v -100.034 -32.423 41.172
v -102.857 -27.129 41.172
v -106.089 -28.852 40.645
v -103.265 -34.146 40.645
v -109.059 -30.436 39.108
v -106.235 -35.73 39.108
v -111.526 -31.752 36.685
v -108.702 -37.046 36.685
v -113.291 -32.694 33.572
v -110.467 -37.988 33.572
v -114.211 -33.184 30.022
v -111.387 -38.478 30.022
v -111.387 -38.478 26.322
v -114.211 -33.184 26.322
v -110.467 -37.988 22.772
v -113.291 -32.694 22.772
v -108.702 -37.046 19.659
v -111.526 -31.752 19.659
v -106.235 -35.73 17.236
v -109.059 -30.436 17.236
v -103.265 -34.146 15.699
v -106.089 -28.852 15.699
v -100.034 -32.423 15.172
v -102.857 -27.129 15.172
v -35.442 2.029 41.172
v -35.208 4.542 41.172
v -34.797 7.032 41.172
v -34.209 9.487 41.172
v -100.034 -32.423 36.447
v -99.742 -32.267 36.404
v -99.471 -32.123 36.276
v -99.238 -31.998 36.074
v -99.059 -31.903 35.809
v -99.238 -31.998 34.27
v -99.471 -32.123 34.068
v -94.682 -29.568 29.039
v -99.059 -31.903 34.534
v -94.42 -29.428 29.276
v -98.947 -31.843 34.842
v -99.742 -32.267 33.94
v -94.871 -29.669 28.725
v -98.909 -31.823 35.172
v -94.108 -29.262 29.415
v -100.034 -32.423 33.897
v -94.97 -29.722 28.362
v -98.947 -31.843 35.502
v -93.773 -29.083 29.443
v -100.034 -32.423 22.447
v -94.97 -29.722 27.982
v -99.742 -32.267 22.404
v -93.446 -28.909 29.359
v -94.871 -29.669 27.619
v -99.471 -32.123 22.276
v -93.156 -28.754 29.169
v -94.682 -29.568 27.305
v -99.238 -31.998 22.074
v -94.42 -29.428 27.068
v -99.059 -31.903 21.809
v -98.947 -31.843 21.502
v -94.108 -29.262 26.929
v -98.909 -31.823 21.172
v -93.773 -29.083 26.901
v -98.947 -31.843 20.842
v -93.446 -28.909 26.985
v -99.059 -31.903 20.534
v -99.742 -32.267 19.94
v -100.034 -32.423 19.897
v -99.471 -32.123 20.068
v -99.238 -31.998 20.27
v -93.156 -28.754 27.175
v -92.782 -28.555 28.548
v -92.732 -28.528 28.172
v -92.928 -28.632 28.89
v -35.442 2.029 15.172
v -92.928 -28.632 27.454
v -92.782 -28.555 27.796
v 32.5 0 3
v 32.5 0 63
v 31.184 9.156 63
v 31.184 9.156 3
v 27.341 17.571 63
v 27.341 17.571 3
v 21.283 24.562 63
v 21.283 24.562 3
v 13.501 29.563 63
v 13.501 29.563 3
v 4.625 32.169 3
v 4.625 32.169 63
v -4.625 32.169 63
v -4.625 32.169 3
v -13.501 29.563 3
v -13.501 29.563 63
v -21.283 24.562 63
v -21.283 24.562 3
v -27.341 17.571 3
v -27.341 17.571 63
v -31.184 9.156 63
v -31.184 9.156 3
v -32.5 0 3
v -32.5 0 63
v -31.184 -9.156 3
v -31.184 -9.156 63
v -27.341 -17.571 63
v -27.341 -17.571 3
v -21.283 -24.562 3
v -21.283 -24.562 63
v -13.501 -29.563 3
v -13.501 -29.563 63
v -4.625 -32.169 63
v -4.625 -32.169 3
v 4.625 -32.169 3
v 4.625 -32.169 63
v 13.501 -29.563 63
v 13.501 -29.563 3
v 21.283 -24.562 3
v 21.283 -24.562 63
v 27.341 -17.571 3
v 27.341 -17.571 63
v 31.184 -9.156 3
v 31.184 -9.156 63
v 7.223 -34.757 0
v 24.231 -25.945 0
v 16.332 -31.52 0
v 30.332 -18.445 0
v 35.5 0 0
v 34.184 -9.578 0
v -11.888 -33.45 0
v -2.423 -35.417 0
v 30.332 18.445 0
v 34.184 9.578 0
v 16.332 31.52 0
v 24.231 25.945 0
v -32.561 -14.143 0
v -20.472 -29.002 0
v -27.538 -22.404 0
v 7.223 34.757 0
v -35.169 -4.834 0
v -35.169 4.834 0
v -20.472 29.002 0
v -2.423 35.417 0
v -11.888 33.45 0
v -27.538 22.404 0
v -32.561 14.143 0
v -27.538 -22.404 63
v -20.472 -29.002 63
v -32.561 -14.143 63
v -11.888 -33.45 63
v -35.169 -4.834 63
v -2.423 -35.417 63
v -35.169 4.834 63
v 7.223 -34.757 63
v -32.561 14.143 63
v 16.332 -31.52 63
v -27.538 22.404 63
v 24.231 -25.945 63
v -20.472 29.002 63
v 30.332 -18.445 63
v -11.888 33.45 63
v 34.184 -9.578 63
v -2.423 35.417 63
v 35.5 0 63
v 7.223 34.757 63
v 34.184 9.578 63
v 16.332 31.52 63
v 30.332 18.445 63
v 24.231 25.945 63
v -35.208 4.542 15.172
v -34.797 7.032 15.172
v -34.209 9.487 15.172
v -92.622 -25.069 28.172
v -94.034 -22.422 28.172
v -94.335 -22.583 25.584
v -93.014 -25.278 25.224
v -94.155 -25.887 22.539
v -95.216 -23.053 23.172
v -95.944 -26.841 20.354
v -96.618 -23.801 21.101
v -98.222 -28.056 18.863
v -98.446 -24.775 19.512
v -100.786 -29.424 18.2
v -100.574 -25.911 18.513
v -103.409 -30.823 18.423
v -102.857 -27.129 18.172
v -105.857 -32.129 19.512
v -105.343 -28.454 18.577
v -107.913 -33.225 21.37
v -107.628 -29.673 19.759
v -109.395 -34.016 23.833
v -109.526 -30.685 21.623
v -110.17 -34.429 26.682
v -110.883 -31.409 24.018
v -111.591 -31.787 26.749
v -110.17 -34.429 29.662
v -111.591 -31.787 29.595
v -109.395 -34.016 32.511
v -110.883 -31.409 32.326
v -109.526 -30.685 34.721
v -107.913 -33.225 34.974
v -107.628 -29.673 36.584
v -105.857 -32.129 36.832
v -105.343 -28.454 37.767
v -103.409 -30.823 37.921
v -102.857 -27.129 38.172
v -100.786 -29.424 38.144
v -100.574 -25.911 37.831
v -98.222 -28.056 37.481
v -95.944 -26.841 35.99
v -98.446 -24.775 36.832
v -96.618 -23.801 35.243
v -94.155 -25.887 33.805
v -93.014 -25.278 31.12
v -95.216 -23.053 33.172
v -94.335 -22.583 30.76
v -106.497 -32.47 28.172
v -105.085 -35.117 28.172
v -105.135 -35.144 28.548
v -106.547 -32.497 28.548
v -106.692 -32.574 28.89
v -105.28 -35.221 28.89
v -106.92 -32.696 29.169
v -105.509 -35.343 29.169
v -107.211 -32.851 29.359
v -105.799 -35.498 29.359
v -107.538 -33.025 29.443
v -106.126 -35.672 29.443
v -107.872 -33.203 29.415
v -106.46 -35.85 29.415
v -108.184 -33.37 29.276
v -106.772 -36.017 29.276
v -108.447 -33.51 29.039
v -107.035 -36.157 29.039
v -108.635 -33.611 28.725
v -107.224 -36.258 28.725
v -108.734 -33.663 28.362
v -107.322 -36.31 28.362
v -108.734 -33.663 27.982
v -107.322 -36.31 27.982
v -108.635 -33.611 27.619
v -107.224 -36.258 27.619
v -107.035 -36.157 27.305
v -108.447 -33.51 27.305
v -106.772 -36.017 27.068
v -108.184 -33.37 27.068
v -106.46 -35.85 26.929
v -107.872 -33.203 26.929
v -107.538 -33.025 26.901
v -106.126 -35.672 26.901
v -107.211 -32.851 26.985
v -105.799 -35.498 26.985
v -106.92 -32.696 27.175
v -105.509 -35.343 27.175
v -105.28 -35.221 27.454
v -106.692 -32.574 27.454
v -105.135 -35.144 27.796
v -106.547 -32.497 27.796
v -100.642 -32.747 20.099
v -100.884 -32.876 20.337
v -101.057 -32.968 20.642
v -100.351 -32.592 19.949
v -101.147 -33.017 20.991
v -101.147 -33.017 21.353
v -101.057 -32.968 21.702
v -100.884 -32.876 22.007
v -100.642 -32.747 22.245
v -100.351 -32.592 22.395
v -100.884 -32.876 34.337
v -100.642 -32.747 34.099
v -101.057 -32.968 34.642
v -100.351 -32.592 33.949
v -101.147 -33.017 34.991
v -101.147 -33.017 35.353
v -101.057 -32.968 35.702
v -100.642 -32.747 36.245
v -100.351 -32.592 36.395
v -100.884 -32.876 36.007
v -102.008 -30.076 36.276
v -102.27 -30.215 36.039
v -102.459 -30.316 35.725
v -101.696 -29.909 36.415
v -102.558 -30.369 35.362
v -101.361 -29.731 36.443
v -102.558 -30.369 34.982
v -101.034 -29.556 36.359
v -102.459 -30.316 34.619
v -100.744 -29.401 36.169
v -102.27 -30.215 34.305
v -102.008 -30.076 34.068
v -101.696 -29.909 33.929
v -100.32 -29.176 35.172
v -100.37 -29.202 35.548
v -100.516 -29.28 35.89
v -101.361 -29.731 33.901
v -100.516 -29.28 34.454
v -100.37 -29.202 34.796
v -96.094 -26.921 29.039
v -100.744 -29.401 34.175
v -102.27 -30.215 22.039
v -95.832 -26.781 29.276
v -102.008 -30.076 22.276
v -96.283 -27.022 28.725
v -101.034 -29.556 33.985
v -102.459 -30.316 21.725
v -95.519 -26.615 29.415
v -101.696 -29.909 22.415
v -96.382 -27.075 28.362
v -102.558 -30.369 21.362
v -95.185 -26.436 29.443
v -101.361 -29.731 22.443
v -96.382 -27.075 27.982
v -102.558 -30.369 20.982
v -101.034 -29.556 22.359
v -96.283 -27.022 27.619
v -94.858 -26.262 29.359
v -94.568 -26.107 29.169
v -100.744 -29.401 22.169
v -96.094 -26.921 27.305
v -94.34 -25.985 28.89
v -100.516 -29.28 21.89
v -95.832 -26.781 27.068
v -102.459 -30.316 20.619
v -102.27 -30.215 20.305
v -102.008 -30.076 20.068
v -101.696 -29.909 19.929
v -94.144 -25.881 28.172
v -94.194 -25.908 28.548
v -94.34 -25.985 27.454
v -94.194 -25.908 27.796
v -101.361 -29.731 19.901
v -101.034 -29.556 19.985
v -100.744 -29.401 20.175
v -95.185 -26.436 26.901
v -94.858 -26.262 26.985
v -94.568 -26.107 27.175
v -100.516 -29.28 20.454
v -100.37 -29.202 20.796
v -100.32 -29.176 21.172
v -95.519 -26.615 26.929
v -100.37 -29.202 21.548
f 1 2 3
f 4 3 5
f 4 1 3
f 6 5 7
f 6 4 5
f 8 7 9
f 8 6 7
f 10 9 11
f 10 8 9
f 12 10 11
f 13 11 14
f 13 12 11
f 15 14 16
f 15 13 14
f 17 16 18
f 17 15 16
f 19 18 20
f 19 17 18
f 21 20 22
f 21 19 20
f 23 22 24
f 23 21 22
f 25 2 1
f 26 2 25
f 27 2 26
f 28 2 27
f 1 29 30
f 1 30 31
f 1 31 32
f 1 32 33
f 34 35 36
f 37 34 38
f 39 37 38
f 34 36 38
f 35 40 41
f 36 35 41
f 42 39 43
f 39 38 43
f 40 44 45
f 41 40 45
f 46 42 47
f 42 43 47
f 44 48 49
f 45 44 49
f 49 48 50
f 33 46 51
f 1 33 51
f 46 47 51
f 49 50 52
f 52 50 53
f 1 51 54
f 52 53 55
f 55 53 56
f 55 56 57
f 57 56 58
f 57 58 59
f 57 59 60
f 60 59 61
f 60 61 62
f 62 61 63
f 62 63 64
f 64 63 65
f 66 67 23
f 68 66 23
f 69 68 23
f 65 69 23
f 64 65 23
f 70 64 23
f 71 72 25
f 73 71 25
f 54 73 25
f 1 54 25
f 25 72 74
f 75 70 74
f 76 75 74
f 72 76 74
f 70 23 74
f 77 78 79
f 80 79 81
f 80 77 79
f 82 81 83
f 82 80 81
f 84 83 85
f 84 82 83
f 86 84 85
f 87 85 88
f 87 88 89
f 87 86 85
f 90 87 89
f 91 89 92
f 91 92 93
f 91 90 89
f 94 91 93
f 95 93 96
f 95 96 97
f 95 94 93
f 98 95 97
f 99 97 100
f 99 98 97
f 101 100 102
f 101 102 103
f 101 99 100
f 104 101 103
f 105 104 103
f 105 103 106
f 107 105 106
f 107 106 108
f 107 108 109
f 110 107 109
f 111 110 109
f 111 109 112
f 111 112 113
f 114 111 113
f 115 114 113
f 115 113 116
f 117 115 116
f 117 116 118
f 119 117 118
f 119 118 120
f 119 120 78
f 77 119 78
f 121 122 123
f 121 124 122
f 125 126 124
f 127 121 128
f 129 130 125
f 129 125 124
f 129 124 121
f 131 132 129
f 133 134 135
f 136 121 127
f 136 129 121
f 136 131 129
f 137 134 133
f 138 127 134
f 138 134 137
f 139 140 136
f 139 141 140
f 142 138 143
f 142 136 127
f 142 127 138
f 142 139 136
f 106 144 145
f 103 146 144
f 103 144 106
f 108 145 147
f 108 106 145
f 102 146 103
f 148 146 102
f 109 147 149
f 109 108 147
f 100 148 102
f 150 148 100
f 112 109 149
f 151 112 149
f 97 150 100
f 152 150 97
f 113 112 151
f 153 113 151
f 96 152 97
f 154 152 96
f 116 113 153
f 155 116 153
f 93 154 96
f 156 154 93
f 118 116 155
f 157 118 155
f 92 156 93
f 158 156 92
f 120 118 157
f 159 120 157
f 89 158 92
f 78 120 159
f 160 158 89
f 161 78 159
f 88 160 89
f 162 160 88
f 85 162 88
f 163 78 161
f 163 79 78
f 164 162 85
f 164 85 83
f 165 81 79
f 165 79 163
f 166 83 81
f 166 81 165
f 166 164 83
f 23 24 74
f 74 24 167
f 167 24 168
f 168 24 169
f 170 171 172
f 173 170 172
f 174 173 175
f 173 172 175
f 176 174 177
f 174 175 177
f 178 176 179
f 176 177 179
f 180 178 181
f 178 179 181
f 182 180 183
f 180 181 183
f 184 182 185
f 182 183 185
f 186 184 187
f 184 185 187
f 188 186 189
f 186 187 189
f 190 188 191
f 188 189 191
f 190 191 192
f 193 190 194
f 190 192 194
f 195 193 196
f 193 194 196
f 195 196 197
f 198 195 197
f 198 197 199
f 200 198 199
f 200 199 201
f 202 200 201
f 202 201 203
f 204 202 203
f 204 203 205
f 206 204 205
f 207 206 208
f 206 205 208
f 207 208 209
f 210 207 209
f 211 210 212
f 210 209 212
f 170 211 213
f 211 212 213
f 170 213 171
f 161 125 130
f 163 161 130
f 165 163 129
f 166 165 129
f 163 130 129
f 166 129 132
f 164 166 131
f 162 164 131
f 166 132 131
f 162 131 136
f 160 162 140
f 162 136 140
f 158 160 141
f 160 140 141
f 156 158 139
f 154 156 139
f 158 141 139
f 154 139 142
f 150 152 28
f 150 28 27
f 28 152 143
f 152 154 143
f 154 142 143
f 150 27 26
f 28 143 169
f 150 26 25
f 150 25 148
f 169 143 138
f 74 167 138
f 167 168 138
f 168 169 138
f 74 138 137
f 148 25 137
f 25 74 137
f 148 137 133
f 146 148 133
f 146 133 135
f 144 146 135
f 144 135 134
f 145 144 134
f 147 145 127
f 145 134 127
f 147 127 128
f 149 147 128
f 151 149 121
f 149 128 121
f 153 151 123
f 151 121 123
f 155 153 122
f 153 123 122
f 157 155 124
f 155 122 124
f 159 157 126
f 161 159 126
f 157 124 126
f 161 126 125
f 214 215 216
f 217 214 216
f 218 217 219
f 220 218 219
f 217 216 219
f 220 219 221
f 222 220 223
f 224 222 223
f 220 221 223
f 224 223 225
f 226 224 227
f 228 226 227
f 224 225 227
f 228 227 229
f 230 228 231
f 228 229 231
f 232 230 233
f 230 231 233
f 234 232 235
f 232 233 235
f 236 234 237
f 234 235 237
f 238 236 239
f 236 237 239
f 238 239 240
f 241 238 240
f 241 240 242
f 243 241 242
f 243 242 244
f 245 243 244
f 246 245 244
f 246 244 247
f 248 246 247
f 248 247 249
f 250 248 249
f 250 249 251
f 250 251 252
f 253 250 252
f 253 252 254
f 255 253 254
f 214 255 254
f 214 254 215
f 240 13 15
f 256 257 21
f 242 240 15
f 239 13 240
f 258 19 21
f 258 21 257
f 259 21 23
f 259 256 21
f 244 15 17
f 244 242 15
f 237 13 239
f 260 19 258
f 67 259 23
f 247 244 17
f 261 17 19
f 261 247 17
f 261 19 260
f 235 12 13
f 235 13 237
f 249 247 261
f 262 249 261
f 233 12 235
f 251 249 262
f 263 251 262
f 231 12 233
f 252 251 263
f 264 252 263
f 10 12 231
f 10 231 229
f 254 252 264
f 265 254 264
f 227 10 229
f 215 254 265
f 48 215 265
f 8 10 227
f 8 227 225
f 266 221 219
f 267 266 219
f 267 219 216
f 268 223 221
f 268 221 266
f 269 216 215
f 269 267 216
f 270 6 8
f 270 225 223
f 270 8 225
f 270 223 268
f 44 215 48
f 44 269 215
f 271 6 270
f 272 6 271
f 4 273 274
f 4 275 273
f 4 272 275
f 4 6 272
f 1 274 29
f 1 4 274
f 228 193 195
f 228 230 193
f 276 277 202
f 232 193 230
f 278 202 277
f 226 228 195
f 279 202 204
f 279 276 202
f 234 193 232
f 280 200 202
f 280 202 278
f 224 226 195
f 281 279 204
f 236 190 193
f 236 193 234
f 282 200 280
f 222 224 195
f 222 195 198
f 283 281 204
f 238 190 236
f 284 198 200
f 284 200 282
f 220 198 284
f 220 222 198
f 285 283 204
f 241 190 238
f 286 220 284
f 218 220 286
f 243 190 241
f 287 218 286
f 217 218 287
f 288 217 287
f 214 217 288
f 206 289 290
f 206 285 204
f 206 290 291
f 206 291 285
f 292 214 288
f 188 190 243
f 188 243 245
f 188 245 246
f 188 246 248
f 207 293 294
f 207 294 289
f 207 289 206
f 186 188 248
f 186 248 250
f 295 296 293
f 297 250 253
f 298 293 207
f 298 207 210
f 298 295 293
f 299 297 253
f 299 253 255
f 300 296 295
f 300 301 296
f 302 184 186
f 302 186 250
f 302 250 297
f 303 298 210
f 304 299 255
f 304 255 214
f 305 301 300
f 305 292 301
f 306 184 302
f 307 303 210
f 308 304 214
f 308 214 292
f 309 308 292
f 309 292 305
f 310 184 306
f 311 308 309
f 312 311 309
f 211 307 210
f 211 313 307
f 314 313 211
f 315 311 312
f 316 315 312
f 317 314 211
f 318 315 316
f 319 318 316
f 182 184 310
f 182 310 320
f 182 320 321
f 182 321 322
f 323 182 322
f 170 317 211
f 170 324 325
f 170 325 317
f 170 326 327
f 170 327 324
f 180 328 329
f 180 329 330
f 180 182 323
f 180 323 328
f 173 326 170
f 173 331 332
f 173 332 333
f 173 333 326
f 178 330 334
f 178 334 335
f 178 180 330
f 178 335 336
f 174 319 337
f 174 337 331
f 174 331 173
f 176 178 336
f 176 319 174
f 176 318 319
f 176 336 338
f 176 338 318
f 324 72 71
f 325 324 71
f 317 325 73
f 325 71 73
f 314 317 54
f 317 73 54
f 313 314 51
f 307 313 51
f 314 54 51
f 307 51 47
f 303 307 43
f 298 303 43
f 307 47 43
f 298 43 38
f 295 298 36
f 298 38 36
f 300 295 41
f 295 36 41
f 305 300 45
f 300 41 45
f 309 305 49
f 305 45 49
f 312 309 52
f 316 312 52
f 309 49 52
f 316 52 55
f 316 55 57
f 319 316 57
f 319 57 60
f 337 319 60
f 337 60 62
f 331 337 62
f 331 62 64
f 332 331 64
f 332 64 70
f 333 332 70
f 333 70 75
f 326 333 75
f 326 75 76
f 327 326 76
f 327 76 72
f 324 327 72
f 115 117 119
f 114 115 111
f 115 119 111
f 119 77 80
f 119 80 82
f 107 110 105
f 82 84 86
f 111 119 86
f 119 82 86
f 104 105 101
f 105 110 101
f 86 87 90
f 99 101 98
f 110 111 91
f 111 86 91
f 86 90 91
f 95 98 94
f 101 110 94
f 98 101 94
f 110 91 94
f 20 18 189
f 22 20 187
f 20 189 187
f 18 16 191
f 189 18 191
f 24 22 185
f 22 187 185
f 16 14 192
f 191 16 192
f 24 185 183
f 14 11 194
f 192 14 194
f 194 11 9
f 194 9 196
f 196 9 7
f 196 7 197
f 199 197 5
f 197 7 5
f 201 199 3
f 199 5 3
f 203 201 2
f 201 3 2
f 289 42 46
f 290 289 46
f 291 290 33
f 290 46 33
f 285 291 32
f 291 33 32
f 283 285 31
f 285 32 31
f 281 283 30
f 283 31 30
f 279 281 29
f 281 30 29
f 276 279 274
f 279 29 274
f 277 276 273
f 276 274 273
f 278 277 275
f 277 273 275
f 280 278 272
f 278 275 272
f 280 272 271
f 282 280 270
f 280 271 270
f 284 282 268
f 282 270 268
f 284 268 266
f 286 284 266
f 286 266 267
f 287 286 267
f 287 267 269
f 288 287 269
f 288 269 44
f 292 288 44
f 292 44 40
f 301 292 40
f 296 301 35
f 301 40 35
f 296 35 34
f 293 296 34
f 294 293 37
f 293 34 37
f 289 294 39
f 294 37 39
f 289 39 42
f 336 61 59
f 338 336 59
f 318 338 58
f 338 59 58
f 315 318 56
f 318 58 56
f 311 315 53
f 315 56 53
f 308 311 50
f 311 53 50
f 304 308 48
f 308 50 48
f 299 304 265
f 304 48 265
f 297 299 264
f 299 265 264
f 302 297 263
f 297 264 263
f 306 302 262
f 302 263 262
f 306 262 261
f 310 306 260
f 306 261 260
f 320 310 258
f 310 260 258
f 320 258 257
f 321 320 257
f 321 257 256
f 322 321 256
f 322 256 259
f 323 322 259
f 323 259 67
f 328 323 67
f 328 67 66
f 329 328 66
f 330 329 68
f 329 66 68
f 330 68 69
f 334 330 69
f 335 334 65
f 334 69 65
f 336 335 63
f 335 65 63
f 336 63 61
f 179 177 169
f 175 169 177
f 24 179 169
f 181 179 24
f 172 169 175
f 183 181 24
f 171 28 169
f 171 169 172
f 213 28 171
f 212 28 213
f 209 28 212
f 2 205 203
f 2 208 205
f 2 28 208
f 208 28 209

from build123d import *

# Parameters (mm, degrees)
SKETCH1_R                = 35.5
SKETCH1_R_2              = 32.5
BOSS_EXTRUDE1_DEPTH      = 63
SKETCH2_R                = 32.5
BOSS_EXTRUDE2_DEPTH      = 3
BOSS_EXTRUDE6_DEPTH      = 14.275
BOSS_EXTRUDE6_DEPTH_BACK = 11.725
SKETCH7_R                = 13
BOSS_EXTRUDE7_DEPTH      = 6
SKETCH8_R                = 10
CUT_EXTRUDE1_DEPTH       = 3
SKETCH9_R                = 1.275
CUT_EXTRUDE2_DEPTH       = 67.65770114


with BuildPart() as part:
    # Sketch1 → Boss-Extrude1 (new body)
    with BuildSketch(Plane.XY):
        Circle(SKETCH1_R)
        Circle(SKETCH1_R_2, mode=Mode.SUBTRACT)
    extrude(amount=BOSS_EXTRUDE1_DEPTH)

    # Sketch2 → Boss-Extrude2 (add)
    with BuildSketch(Plane(origin=(0, 0, 0), x_dir=(-1, 0, 0), z_dir=(0, 0, -1))):
        Circle(SKETCH2_R)
    extrude(amount=-BOSS_EXTRUDE2_DEPTH)

    # Sketch6 → Boss-Extrude6 (add, two sides)
    with BuildSketch(Plane.XY.offset(26.896958138)) as boss_extrude6_sk:
        with BuildLine():
            Line((-34.208935101, 9.486767586), (-102.85732032, -27.128564879))
            Line((-102.85732032, -27.128564879), (-100.033619175, -32.422590931))
            Line((-100.033619175, -32.422590931), (-35.441970042, 2.028979924))
            ThreePointArc((-35.441970042, 2.028979924), (-35.024517071, 5.790786127), (-34.208935101, 9.486767586))
        make_face()
    extrude(amount=BOSS_EXTRUDE6_DEPTH)
    extrude(boss_extrude6_sk.sketch, amount=-BOSS_EXTRUDE6_DEPTH_BACK)

    # Sketch7 → Boss-Extrude7 (add)
    with BuildSketch(Plane(origin=(-8.692215236, 16.296630393, 0), x_dir=(0.882337675, 0.470616858, 0), z_dir=(0.470616858, -0.882337675, 0))):
        with Locations((-103.522048859, 28.171958138)):
            Circle(SKETCH7_R)
    extrude(amount=-BOSS_EXTRUDE7_DEPTH)

    # Sketch8 → Cut-Extrude1 (cut)
    with BuildSketch(Plane(origin=(-11.515916381, 21.590656445, 0), x_dir=(0.882337675, 0.470616858, 0), z_dir=(-0.470616858, 0.882337675, 0))):
        with Locations((-103.522048859, -28.171958138)):
            Circle(SKETCH8_R)
    extrude(amount=-CUT_EXTRUDE1_DEPTH, mode=Mode.SUBTRACT)

    # Sketch9 → Cut-Extrude2 (cut, through all)
    with BuildSketch(Plane(origin=(-8.692215236, 16.296630393, 0), x_dir=(0.882337675, 0.470616858, 0), z_dir=(0.470616858, -0.882337675, 0))):
        with Locations((-103.522048859, 35.171958138)):
            Circle(SKETCH9_R)
        with Locations((-110.522048859, 28.171958138)):
            Circle(SKETCH9_R)
        with Locations((-96.522048859, 28.171958138)):
            Circle(SKETCH9_R)
        with Locations((-103.522048859, 21.171958138)):
            Circle(SKETCH9_R)
    extrude(amount=-CUT_EXTRUDE2_DEPTH, mode=Mode.SUBTRACT)


solid = part.part
